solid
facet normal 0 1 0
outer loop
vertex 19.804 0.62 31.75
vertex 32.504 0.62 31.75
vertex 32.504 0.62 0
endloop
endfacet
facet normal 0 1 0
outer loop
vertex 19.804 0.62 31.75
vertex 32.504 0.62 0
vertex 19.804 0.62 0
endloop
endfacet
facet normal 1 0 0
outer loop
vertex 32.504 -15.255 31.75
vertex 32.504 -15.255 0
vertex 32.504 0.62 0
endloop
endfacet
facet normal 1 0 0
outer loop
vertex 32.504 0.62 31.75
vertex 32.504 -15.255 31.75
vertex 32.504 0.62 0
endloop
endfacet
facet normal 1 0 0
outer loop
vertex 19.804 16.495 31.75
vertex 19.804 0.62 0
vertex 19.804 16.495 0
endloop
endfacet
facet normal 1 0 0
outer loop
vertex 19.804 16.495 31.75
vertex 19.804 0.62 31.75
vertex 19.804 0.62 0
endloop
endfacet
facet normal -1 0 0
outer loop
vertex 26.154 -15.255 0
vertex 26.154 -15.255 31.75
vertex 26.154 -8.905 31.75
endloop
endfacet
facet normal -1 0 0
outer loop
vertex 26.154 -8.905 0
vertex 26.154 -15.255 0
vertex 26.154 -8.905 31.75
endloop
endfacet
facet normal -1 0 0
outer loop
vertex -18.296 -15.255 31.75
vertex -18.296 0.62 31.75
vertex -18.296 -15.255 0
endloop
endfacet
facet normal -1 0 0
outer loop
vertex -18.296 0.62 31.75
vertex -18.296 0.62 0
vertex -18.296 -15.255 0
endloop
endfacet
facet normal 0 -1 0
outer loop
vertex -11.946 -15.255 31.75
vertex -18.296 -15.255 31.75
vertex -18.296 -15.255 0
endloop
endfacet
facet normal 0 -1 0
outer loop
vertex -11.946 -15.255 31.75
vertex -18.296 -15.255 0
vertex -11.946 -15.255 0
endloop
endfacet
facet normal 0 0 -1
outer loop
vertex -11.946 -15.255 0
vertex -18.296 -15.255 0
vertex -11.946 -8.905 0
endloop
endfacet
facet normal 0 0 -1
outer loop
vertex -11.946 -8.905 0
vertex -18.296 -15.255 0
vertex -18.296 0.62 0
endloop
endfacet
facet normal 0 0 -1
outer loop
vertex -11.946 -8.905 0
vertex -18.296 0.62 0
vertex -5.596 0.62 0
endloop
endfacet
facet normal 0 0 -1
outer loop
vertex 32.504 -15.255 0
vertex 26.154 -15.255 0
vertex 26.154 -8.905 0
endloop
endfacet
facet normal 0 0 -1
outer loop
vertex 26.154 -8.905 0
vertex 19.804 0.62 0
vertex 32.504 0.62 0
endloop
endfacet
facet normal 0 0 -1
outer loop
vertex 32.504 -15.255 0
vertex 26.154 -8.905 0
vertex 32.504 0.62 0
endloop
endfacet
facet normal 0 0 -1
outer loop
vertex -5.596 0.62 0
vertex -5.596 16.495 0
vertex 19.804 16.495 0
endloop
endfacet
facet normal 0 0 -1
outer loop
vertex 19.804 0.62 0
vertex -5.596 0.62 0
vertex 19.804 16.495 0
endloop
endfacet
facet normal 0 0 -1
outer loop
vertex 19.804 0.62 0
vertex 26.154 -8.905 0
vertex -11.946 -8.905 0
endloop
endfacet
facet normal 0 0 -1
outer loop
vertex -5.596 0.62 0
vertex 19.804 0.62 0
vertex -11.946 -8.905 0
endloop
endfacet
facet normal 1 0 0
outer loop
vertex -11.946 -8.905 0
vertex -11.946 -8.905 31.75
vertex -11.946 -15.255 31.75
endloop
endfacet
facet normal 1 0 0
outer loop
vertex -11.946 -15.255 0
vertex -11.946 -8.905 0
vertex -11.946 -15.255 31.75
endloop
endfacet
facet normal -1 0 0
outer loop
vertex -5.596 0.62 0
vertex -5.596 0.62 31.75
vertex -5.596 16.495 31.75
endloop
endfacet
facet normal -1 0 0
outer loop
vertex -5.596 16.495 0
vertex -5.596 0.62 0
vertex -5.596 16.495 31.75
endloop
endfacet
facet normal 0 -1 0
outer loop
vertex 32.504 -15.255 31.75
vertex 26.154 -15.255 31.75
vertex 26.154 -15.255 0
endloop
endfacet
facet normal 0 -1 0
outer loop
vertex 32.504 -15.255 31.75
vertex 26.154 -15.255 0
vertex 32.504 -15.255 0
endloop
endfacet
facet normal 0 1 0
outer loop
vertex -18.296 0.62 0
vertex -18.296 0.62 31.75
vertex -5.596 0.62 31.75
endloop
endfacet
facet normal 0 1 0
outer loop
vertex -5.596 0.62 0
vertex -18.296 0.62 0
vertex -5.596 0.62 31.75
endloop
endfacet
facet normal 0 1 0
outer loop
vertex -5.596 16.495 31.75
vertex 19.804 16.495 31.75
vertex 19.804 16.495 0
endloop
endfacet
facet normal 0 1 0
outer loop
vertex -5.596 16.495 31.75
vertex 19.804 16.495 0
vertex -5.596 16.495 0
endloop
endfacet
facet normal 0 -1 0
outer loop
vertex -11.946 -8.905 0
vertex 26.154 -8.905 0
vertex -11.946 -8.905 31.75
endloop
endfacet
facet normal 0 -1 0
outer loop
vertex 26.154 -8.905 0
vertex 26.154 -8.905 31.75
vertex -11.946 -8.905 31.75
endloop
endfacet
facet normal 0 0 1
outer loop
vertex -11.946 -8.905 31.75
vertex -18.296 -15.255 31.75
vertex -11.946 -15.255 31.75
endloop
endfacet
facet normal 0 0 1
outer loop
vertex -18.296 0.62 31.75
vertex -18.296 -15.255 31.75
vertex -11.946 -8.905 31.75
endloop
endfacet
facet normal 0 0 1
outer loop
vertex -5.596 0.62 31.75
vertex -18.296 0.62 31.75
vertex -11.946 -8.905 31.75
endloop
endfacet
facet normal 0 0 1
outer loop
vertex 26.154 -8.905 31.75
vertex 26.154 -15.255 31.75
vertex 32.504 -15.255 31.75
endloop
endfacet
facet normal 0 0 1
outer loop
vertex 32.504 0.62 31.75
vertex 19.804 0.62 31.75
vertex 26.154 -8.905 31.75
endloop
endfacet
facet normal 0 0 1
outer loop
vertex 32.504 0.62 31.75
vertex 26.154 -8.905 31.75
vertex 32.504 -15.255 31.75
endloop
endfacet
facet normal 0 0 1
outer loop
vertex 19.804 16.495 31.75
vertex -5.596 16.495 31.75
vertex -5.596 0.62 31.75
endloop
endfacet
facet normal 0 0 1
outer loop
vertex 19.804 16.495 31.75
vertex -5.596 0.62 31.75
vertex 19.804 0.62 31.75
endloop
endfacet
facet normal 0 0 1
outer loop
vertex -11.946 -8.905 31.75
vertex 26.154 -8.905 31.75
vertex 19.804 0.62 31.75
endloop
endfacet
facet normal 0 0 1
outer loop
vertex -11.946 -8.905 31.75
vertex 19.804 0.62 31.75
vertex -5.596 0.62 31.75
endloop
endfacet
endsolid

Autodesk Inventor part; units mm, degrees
ref_plane "YZ Plane" through (0, 0, 0) normal (1, 0, 0) x (0, 1, 0)
ref_plane "XZ Plane" through (0, 0, 0) normal (0, 1, 0) x (-1, 0, 0)
ref_plane "XY Plane" through (0, 0, 0) normal (0, 0, 1) x (1, 0, 0)
sketch "Sketch1" plane through (0, 0, 0) normal (0, 0, 1) x (1, 0, 0)
  line L0 (-18.2958, -15.2546) -> (32.5042, -15.2546)
  line L1 (32.5042, -15.2546) -> (32.5042, 16.4954)
  line L2 (32.5042, 16.4954) -> (-18.2958, 16.4954)
  line L3 (-18.2958, 16.4954) -> (-18.2958, -15.2546)
  point P0 (0, 0)
  dimension "d0" = 50.8
  dimension "d1" = 31.75
extrude "Extrusion1" add sketch "Sketch1" along normal blind 31.75
sketch "Sketch2" plane through (0, 0, 31.75) normal (0, 0, 1) x (1, 0, 0)
  line L0 (32.5042, 16.4954) -> (-18.2958, 16.4954) projected
  line L1 (32.5042, -15.2546) -> (32.5042, 16.4954) projected
  line L2 (19.8042, 16.4954) -> (32.5042, 16.4954)
  line L3 (32.5042, 16.4954) -> (32.5042, 0.6204)
  line L4 (32.5042, 0.6204) -> (19.8042, 0.6204)
  line L5 (19.8042, 0.6204) -> (19.8042, 16.4954)
  line L6 (-18.2958, 16.4954) -> (-18.2958, -15.2546) projected
  line L7 (-18.2958, 0.6204) -> (-5.5958, 0.6204)
  line L8 (-5.5958, 0.6204) -> (-5.5958, 16.4954)
  line L9 (-5.5958, 16.4954) -> (-18.2958, 16.4954)
  line L10 (-18.2958, 16.4954) -> (-18.2958, 0.6204)
  point P0 (0, 0)
  dimension "d4" = 15.875
  dimension "d5" = 12.7
  dimension "d6" = 15.875
  dimension "d7" = 12.7
extrude "Extrusion2" cut sketch "Sketch2" against normal blind 31.75
sketch "Sketch3" plane through (0, 0, 31.75) normal (0, 0, 1) x (1, 0, 0)
  line L0 (-18.2958, -15.2546) -> (32.5042, -15.2546) projected
  line L1 (-11.9458, -15.2546) -> (26.1542, -15.2546)
  line L2 (26.1542, -15.2546) -> (26.1542, -8.9046)
  line L3 (26.1542, -8.9046) -> (-11.9458, -8.9046)
  line L4 (-11.9458, -8.9046) -> (-11.9458, -15.2546)
  line L5 (-18.2958, 0.6204) -> (-18.2958, -15.2546) projected
  line L6 (32.5042, -15.2546) -> (32.5042, 0.6204) projected
  point P0 (0, 0)
  dimension "d10" = 6.35
  dimension "d11" = 6.35
  dimension "d12" = 6.35
extrude "Extrusion3" cut sketch "Sketch3" against normal blind 31.75
properties part number "Figure 7_27_2"
